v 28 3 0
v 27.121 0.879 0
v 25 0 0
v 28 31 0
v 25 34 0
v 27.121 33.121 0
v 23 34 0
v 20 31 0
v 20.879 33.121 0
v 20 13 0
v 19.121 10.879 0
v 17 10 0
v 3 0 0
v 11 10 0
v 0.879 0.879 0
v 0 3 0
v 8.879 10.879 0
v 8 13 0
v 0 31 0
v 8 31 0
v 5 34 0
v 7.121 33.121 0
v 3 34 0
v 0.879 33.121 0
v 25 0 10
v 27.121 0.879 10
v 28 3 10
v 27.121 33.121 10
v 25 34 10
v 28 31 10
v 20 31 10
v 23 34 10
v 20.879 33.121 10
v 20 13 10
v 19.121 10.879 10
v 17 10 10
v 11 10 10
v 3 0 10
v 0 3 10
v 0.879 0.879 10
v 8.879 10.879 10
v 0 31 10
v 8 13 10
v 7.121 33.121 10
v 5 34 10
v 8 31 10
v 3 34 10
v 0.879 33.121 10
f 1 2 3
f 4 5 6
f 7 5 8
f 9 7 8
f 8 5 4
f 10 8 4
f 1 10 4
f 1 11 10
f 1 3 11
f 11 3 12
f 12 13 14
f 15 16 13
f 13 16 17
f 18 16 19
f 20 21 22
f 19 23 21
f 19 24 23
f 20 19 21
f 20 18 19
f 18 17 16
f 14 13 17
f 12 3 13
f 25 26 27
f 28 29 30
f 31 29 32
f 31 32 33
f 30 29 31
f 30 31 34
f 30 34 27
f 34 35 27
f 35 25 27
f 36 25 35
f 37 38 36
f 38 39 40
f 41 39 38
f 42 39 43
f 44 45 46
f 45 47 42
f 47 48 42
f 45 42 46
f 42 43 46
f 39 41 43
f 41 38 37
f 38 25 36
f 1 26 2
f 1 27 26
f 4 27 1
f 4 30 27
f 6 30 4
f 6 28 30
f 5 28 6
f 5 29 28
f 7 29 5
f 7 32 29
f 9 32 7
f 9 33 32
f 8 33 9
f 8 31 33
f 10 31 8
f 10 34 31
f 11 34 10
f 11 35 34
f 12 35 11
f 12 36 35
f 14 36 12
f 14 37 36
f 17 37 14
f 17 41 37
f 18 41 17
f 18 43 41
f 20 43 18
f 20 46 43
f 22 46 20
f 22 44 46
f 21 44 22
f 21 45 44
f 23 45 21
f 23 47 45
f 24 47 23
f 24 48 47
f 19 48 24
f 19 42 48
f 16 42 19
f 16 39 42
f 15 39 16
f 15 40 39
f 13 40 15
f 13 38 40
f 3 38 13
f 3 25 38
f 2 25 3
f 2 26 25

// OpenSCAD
$fn = 32;

// ----------------------------------------------------------------------
// Eye lug: clevis, 10 mm thick
// ----------------------------------------------------------------------

// --- parameters (mm) ---
profile_height = 10;      // extrusion height
profile_points = 24;      // points of the closed outline

profile = [[0, 3], [0.879, 0.879], [3, 0], [25, 0], [27.121, 0.879], [28, 3], [28, 31], [27.121, 33.121], [25, 34], [23, 34], [20.879, 33.121], [20, 31], [20, 13], [19.121, 10.879], [17, 10], [11, 10], [8.879, 10.879], [8, 13], [8, 31], [7.121, 33.121], [5, 34], [3, 34], [0.879, 33.121], [0, 31]];  // single closed polygon, 24 points, counter clockwise

// --- the one profile operation ---
linear_extrude(height = profile_height) polygon(points = profile);
